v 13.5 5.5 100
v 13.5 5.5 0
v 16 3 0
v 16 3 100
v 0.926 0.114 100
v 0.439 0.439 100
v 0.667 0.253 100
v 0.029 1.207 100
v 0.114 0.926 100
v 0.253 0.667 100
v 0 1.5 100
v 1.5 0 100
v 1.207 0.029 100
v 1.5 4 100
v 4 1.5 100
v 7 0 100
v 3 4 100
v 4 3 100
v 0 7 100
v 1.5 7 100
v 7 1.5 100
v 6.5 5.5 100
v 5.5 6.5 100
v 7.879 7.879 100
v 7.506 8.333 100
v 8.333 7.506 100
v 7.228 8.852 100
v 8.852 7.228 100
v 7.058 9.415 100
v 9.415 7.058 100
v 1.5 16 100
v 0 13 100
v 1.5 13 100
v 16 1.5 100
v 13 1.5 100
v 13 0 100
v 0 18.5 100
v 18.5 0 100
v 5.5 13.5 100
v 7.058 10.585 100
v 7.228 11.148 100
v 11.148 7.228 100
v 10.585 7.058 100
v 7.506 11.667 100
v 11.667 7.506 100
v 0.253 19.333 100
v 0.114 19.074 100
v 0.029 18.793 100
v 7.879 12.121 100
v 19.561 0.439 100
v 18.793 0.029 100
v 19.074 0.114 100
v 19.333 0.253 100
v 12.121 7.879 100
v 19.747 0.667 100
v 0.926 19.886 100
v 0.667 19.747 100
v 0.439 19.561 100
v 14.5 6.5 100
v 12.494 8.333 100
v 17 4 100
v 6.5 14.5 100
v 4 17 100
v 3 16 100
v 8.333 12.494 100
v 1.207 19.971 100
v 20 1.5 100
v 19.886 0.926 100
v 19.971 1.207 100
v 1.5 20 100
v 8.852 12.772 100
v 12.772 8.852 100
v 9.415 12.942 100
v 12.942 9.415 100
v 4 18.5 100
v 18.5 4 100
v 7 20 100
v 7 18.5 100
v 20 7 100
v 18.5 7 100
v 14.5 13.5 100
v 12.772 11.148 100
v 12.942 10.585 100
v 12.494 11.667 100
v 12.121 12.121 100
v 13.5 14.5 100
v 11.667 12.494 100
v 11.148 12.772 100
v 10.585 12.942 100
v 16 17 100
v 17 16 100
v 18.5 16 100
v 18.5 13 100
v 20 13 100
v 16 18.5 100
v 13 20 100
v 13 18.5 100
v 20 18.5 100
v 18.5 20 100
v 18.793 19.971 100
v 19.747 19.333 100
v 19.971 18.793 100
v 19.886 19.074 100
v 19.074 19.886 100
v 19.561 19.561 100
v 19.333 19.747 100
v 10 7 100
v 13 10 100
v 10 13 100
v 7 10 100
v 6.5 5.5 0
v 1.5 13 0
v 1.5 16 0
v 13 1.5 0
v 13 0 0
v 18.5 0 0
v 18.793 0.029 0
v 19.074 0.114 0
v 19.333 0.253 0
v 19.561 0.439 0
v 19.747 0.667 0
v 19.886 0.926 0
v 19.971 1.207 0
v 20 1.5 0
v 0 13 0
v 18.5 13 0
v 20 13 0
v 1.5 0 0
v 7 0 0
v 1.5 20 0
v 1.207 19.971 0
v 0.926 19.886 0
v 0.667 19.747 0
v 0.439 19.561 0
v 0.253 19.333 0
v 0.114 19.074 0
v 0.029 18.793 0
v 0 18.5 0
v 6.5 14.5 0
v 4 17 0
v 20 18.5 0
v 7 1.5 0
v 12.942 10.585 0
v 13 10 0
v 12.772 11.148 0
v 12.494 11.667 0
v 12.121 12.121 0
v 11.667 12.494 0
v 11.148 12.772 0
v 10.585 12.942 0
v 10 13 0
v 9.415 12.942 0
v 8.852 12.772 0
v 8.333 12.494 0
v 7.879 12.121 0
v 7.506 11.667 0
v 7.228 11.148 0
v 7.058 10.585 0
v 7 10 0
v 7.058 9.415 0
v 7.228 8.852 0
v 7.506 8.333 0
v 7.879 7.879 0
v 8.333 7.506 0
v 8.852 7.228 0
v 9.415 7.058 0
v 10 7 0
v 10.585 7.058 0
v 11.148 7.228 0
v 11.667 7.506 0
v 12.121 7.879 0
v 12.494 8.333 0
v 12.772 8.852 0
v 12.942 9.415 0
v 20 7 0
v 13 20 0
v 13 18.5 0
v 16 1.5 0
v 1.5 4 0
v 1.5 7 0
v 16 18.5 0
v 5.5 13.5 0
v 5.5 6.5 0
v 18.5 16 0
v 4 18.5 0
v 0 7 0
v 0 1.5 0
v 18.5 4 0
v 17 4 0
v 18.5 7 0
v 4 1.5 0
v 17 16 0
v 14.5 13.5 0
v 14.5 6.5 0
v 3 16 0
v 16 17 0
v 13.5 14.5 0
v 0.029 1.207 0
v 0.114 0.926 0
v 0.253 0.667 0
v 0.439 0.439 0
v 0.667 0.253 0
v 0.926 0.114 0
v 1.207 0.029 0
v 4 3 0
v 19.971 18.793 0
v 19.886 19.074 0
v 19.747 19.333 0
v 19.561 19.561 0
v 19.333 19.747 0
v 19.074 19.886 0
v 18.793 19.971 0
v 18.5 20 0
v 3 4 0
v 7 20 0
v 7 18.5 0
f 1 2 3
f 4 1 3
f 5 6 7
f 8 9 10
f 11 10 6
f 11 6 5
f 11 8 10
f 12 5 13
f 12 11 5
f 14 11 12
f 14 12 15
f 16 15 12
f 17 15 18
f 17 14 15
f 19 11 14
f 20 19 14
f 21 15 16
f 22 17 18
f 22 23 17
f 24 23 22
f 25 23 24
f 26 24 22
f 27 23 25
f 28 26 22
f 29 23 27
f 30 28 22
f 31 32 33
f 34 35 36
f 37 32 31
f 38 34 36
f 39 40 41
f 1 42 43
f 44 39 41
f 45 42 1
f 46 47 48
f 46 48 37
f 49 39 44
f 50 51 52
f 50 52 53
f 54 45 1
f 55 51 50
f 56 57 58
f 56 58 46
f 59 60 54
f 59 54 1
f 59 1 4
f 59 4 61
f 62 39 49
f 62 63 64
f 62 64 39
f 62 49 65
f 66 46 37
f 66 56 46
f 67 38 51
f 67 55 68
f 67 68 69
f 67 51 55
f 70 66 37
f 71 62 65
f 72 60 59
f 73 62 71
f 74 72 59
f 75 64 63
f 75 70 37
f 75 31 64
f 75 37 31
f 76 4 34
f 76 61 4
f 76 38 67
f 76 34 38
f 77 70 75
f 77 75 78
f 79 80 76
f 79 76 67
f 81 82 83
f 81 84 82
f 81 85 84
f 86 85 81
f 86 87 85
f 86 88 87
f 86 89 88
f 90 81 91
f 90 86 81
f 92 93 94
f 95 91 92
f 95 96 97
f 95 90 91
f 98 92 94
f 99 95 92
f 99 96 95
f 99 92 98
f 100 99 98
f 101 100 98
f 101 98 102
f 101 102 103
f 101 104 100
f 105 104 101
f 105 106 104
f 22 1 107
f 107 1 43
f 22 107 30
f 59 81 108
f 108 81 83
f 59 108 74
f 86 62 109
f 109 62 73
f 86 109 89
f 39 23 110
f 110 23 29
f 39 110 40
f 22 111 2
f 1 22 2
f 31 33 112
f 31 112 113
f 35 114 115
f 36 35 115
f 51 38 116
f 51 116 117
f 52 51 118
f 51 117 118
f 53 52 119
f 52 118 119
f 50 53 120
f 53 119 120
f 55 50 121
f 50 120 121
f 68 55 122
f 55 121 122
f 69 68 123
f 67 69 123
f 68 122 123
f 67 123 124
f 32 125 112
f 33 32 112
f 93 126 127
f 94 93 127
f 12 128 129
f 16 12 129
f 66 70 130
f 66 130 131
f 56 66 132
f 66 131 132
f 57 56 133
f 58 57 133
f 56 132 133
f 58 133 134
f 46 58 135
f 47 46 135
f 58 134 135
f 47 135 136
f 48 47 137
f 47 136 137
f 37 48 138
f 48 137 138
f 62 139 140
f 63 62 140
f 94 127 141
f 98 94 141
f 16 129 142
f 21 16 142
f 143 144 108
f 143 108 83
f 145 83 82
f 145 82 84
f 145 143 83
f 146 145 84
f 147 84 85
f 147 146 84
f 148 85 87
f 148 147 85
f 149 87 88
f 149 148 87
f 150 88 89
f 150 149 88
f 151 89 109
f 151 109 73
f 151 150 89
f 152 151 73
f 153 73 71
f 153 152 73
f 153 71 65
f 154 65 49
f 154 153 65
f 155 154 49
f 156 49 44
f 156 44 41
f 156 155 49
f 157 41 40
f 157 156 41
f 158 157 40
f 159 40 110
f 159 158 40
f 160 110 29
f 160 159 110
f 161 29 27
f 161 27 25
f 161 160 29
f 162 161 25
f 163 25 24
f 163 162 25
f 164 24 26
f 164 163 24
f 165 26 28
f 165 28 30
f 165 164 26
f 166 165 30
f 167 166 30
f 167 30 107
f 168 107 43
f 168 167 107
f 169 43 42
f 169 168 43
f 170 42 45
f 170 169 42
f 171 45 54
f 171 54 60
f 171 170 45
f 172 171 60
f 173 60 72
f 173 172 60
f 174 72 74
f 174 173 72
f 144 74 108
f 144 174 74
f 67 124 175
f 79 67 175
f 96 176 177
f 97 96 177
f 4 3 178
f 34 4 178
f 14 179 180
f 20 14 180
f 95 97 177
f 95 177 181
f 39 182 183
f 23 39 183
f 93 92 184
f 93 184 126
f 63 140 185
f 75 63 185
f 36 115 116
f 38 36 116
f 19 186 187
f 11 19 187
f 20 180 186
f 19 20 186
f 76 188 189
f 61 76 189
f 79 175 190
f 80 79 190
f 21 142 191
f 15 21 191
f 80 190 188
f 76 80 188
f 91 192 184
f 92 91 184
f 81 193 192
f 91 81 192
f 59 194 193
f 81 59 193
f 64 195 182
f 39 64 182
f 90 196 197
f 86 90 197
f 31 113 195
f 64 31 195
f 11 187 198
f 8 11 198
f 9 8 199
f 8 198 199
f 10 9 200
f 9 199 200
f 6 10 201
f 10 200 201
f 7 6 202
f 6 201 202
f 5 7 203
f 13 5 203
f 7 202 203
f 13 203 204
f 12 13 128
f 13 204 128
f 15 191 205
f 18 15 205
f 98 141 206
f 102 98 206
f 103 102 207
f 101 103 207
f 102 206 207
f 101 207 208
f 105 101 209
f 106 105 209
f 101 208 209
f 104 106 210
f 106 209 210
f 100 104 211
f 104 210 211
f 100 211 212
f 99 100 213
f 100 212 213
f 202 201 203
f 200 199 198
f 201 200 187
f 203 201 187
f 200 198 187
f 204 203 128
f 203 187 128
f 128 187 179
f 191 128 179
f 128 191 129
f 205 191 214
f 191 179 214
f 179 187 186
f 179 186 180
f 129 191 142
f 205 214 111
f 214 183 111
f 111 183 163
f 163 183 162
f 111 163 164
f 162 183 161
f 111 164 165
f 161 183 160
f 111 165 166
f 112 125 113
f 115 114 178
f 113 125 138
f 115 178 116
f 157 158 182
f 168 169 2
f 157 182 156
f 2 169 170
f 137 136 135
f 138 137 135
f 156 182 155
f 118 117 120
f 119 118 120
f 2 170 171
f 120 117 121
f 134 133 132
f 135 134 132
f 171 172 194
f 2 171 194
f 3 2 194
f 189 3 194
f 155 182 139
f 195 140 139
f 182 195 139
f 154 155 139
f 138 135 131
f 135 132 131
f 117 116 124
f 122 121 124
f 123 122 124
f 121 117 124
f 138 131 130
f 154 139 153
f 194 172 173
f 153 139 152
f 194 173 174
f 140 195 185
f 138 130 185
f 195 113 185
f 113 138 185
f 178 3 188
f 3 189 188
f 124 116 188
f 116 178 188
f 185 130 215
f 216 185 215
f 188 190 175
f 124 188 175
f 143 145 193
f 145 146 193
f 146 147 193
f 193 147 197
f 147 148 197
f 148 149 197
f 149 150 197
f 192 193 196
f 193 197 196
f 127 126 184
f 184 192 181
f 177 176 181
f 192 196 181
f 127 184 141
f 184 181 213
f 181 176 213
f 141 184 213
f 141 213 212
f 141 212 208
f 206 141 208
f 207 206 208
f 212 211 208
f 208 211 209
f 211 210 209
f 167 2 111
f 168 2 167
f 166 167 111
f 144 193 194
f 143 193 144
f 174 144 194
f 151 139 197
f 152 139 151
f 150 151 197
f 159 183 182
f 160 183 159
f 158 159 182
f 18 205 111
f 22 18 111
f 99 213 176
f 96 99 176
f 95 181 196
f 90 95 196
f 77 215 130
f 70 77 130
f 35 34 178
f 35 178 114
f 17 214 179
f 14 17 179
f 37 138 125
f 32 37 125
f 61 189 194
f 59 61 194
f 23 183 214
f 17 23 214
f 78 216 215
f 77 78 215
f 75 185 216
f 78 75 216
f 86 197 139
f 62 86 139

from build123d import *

# Parameters (mm, degrees)
F0_R     = 3
F1_DEPTH = 100


with BuildPart() as f1:
    # F0 (on Top) → F1 (new body)
    with BuildSketch(Plane.XY):
        with BuildLine():
            ThreePointArc((0, 1.5), (0.43934, 0.43934), (1.5, 0))
            Line((1.5, 0), (7, 0))
            Line((7, 0), (7, 1.5))
            Line((7, 1.5), (4, 1.5))
            Line((4, 1.5), (4, 3))
            Line((4, 3), (6.5, 5.5))
            Line((6.5, 5.5), (10, 5.5))
            Line((10, 5.5), (13.5, 5.5))
            Line((13.5, 5.5), (16, 3))
            Line((16, 3), (16, 1.5))
            Line((16, 1.5), (13, 1.5))
            Line((13, 1.5), (13, 0))
            Line((13, 0), (18.5, 0))
            ThreePointArc((18.5, 0), (19.56066, 0.43934), (20, 1.5))
            Line((20, 1.5), (20, 7))
            Line((20, 7), (18.5, 7))
            Line((18.5, 7), (18.5, 4))
            Line((18.5, 4), (17, 4))
            Line((17, 4), (14.5, 6.5))
            Line((14.5, 6.5), (14.5, 10))
            Line((14.5, 10), (14.5, 13.5))
            Line((14.5, 13.5), (17, 16))
            Line((17, 16), (18.5, 16))
            Line((18.5, 16), (18.5, 13))
            Line((18.5, 13), (20, 13))
            Line((20, 13), (20, 18.5))
            ThreePointArc((20, 18.5), (19.56066, 19.56066), (18.5, 20))
            Line((18.5, 20), (13, 20))
            Line((13, 20), (13, 18.5))
            Line((13, 18.5), (16, 18.5))
            Line((16, 18.5), (16, 17))
            Line((16, 17), (13.5, 14.5))
            Line((13.5, 14.5), (10, 14.5))
            Line((10, 14.5), (6.5, 14.5))
            Line((6.5, 14.5), (4, 17))
            Line((4, 17), (4, 18.5))
            Line((4, 18.5), (7, 18.5))
            Line((7, 18.5), (7, 20))
            Line((7, 20), (1.5, 20))
            ThreePointArc((1.5, 20), (0.43934, 19.56066), (0, 18.5))
            Line((0, 18.5), (0, 13))
            Line((0, 13), (1.5, 13))
            Line((1.5, 13), (1.5, 16))
            Line((1.5, 16), (3, 16))
            Line((3, 16), (5.5, 13.5))
            Line((5.5, 13.5), (5.5, 10))
            Line((5.5, 10), (5.5, 6.5))
            Line((5.5, 6.5), (3, 4))
            Line((3, 4), (1.5, 4))
            Line((1.5, 4), (1.5, 7))
            Line((1.5, 7), (0, 7))
            Line((0, 7), (0, 1.5))
        make_face()
        with Locations((10, 10)):
            Circle(F0_R, mode=Mode.SUBTRACT)
    extrude(amount=F1_DEPTH)


solid = f1.part
